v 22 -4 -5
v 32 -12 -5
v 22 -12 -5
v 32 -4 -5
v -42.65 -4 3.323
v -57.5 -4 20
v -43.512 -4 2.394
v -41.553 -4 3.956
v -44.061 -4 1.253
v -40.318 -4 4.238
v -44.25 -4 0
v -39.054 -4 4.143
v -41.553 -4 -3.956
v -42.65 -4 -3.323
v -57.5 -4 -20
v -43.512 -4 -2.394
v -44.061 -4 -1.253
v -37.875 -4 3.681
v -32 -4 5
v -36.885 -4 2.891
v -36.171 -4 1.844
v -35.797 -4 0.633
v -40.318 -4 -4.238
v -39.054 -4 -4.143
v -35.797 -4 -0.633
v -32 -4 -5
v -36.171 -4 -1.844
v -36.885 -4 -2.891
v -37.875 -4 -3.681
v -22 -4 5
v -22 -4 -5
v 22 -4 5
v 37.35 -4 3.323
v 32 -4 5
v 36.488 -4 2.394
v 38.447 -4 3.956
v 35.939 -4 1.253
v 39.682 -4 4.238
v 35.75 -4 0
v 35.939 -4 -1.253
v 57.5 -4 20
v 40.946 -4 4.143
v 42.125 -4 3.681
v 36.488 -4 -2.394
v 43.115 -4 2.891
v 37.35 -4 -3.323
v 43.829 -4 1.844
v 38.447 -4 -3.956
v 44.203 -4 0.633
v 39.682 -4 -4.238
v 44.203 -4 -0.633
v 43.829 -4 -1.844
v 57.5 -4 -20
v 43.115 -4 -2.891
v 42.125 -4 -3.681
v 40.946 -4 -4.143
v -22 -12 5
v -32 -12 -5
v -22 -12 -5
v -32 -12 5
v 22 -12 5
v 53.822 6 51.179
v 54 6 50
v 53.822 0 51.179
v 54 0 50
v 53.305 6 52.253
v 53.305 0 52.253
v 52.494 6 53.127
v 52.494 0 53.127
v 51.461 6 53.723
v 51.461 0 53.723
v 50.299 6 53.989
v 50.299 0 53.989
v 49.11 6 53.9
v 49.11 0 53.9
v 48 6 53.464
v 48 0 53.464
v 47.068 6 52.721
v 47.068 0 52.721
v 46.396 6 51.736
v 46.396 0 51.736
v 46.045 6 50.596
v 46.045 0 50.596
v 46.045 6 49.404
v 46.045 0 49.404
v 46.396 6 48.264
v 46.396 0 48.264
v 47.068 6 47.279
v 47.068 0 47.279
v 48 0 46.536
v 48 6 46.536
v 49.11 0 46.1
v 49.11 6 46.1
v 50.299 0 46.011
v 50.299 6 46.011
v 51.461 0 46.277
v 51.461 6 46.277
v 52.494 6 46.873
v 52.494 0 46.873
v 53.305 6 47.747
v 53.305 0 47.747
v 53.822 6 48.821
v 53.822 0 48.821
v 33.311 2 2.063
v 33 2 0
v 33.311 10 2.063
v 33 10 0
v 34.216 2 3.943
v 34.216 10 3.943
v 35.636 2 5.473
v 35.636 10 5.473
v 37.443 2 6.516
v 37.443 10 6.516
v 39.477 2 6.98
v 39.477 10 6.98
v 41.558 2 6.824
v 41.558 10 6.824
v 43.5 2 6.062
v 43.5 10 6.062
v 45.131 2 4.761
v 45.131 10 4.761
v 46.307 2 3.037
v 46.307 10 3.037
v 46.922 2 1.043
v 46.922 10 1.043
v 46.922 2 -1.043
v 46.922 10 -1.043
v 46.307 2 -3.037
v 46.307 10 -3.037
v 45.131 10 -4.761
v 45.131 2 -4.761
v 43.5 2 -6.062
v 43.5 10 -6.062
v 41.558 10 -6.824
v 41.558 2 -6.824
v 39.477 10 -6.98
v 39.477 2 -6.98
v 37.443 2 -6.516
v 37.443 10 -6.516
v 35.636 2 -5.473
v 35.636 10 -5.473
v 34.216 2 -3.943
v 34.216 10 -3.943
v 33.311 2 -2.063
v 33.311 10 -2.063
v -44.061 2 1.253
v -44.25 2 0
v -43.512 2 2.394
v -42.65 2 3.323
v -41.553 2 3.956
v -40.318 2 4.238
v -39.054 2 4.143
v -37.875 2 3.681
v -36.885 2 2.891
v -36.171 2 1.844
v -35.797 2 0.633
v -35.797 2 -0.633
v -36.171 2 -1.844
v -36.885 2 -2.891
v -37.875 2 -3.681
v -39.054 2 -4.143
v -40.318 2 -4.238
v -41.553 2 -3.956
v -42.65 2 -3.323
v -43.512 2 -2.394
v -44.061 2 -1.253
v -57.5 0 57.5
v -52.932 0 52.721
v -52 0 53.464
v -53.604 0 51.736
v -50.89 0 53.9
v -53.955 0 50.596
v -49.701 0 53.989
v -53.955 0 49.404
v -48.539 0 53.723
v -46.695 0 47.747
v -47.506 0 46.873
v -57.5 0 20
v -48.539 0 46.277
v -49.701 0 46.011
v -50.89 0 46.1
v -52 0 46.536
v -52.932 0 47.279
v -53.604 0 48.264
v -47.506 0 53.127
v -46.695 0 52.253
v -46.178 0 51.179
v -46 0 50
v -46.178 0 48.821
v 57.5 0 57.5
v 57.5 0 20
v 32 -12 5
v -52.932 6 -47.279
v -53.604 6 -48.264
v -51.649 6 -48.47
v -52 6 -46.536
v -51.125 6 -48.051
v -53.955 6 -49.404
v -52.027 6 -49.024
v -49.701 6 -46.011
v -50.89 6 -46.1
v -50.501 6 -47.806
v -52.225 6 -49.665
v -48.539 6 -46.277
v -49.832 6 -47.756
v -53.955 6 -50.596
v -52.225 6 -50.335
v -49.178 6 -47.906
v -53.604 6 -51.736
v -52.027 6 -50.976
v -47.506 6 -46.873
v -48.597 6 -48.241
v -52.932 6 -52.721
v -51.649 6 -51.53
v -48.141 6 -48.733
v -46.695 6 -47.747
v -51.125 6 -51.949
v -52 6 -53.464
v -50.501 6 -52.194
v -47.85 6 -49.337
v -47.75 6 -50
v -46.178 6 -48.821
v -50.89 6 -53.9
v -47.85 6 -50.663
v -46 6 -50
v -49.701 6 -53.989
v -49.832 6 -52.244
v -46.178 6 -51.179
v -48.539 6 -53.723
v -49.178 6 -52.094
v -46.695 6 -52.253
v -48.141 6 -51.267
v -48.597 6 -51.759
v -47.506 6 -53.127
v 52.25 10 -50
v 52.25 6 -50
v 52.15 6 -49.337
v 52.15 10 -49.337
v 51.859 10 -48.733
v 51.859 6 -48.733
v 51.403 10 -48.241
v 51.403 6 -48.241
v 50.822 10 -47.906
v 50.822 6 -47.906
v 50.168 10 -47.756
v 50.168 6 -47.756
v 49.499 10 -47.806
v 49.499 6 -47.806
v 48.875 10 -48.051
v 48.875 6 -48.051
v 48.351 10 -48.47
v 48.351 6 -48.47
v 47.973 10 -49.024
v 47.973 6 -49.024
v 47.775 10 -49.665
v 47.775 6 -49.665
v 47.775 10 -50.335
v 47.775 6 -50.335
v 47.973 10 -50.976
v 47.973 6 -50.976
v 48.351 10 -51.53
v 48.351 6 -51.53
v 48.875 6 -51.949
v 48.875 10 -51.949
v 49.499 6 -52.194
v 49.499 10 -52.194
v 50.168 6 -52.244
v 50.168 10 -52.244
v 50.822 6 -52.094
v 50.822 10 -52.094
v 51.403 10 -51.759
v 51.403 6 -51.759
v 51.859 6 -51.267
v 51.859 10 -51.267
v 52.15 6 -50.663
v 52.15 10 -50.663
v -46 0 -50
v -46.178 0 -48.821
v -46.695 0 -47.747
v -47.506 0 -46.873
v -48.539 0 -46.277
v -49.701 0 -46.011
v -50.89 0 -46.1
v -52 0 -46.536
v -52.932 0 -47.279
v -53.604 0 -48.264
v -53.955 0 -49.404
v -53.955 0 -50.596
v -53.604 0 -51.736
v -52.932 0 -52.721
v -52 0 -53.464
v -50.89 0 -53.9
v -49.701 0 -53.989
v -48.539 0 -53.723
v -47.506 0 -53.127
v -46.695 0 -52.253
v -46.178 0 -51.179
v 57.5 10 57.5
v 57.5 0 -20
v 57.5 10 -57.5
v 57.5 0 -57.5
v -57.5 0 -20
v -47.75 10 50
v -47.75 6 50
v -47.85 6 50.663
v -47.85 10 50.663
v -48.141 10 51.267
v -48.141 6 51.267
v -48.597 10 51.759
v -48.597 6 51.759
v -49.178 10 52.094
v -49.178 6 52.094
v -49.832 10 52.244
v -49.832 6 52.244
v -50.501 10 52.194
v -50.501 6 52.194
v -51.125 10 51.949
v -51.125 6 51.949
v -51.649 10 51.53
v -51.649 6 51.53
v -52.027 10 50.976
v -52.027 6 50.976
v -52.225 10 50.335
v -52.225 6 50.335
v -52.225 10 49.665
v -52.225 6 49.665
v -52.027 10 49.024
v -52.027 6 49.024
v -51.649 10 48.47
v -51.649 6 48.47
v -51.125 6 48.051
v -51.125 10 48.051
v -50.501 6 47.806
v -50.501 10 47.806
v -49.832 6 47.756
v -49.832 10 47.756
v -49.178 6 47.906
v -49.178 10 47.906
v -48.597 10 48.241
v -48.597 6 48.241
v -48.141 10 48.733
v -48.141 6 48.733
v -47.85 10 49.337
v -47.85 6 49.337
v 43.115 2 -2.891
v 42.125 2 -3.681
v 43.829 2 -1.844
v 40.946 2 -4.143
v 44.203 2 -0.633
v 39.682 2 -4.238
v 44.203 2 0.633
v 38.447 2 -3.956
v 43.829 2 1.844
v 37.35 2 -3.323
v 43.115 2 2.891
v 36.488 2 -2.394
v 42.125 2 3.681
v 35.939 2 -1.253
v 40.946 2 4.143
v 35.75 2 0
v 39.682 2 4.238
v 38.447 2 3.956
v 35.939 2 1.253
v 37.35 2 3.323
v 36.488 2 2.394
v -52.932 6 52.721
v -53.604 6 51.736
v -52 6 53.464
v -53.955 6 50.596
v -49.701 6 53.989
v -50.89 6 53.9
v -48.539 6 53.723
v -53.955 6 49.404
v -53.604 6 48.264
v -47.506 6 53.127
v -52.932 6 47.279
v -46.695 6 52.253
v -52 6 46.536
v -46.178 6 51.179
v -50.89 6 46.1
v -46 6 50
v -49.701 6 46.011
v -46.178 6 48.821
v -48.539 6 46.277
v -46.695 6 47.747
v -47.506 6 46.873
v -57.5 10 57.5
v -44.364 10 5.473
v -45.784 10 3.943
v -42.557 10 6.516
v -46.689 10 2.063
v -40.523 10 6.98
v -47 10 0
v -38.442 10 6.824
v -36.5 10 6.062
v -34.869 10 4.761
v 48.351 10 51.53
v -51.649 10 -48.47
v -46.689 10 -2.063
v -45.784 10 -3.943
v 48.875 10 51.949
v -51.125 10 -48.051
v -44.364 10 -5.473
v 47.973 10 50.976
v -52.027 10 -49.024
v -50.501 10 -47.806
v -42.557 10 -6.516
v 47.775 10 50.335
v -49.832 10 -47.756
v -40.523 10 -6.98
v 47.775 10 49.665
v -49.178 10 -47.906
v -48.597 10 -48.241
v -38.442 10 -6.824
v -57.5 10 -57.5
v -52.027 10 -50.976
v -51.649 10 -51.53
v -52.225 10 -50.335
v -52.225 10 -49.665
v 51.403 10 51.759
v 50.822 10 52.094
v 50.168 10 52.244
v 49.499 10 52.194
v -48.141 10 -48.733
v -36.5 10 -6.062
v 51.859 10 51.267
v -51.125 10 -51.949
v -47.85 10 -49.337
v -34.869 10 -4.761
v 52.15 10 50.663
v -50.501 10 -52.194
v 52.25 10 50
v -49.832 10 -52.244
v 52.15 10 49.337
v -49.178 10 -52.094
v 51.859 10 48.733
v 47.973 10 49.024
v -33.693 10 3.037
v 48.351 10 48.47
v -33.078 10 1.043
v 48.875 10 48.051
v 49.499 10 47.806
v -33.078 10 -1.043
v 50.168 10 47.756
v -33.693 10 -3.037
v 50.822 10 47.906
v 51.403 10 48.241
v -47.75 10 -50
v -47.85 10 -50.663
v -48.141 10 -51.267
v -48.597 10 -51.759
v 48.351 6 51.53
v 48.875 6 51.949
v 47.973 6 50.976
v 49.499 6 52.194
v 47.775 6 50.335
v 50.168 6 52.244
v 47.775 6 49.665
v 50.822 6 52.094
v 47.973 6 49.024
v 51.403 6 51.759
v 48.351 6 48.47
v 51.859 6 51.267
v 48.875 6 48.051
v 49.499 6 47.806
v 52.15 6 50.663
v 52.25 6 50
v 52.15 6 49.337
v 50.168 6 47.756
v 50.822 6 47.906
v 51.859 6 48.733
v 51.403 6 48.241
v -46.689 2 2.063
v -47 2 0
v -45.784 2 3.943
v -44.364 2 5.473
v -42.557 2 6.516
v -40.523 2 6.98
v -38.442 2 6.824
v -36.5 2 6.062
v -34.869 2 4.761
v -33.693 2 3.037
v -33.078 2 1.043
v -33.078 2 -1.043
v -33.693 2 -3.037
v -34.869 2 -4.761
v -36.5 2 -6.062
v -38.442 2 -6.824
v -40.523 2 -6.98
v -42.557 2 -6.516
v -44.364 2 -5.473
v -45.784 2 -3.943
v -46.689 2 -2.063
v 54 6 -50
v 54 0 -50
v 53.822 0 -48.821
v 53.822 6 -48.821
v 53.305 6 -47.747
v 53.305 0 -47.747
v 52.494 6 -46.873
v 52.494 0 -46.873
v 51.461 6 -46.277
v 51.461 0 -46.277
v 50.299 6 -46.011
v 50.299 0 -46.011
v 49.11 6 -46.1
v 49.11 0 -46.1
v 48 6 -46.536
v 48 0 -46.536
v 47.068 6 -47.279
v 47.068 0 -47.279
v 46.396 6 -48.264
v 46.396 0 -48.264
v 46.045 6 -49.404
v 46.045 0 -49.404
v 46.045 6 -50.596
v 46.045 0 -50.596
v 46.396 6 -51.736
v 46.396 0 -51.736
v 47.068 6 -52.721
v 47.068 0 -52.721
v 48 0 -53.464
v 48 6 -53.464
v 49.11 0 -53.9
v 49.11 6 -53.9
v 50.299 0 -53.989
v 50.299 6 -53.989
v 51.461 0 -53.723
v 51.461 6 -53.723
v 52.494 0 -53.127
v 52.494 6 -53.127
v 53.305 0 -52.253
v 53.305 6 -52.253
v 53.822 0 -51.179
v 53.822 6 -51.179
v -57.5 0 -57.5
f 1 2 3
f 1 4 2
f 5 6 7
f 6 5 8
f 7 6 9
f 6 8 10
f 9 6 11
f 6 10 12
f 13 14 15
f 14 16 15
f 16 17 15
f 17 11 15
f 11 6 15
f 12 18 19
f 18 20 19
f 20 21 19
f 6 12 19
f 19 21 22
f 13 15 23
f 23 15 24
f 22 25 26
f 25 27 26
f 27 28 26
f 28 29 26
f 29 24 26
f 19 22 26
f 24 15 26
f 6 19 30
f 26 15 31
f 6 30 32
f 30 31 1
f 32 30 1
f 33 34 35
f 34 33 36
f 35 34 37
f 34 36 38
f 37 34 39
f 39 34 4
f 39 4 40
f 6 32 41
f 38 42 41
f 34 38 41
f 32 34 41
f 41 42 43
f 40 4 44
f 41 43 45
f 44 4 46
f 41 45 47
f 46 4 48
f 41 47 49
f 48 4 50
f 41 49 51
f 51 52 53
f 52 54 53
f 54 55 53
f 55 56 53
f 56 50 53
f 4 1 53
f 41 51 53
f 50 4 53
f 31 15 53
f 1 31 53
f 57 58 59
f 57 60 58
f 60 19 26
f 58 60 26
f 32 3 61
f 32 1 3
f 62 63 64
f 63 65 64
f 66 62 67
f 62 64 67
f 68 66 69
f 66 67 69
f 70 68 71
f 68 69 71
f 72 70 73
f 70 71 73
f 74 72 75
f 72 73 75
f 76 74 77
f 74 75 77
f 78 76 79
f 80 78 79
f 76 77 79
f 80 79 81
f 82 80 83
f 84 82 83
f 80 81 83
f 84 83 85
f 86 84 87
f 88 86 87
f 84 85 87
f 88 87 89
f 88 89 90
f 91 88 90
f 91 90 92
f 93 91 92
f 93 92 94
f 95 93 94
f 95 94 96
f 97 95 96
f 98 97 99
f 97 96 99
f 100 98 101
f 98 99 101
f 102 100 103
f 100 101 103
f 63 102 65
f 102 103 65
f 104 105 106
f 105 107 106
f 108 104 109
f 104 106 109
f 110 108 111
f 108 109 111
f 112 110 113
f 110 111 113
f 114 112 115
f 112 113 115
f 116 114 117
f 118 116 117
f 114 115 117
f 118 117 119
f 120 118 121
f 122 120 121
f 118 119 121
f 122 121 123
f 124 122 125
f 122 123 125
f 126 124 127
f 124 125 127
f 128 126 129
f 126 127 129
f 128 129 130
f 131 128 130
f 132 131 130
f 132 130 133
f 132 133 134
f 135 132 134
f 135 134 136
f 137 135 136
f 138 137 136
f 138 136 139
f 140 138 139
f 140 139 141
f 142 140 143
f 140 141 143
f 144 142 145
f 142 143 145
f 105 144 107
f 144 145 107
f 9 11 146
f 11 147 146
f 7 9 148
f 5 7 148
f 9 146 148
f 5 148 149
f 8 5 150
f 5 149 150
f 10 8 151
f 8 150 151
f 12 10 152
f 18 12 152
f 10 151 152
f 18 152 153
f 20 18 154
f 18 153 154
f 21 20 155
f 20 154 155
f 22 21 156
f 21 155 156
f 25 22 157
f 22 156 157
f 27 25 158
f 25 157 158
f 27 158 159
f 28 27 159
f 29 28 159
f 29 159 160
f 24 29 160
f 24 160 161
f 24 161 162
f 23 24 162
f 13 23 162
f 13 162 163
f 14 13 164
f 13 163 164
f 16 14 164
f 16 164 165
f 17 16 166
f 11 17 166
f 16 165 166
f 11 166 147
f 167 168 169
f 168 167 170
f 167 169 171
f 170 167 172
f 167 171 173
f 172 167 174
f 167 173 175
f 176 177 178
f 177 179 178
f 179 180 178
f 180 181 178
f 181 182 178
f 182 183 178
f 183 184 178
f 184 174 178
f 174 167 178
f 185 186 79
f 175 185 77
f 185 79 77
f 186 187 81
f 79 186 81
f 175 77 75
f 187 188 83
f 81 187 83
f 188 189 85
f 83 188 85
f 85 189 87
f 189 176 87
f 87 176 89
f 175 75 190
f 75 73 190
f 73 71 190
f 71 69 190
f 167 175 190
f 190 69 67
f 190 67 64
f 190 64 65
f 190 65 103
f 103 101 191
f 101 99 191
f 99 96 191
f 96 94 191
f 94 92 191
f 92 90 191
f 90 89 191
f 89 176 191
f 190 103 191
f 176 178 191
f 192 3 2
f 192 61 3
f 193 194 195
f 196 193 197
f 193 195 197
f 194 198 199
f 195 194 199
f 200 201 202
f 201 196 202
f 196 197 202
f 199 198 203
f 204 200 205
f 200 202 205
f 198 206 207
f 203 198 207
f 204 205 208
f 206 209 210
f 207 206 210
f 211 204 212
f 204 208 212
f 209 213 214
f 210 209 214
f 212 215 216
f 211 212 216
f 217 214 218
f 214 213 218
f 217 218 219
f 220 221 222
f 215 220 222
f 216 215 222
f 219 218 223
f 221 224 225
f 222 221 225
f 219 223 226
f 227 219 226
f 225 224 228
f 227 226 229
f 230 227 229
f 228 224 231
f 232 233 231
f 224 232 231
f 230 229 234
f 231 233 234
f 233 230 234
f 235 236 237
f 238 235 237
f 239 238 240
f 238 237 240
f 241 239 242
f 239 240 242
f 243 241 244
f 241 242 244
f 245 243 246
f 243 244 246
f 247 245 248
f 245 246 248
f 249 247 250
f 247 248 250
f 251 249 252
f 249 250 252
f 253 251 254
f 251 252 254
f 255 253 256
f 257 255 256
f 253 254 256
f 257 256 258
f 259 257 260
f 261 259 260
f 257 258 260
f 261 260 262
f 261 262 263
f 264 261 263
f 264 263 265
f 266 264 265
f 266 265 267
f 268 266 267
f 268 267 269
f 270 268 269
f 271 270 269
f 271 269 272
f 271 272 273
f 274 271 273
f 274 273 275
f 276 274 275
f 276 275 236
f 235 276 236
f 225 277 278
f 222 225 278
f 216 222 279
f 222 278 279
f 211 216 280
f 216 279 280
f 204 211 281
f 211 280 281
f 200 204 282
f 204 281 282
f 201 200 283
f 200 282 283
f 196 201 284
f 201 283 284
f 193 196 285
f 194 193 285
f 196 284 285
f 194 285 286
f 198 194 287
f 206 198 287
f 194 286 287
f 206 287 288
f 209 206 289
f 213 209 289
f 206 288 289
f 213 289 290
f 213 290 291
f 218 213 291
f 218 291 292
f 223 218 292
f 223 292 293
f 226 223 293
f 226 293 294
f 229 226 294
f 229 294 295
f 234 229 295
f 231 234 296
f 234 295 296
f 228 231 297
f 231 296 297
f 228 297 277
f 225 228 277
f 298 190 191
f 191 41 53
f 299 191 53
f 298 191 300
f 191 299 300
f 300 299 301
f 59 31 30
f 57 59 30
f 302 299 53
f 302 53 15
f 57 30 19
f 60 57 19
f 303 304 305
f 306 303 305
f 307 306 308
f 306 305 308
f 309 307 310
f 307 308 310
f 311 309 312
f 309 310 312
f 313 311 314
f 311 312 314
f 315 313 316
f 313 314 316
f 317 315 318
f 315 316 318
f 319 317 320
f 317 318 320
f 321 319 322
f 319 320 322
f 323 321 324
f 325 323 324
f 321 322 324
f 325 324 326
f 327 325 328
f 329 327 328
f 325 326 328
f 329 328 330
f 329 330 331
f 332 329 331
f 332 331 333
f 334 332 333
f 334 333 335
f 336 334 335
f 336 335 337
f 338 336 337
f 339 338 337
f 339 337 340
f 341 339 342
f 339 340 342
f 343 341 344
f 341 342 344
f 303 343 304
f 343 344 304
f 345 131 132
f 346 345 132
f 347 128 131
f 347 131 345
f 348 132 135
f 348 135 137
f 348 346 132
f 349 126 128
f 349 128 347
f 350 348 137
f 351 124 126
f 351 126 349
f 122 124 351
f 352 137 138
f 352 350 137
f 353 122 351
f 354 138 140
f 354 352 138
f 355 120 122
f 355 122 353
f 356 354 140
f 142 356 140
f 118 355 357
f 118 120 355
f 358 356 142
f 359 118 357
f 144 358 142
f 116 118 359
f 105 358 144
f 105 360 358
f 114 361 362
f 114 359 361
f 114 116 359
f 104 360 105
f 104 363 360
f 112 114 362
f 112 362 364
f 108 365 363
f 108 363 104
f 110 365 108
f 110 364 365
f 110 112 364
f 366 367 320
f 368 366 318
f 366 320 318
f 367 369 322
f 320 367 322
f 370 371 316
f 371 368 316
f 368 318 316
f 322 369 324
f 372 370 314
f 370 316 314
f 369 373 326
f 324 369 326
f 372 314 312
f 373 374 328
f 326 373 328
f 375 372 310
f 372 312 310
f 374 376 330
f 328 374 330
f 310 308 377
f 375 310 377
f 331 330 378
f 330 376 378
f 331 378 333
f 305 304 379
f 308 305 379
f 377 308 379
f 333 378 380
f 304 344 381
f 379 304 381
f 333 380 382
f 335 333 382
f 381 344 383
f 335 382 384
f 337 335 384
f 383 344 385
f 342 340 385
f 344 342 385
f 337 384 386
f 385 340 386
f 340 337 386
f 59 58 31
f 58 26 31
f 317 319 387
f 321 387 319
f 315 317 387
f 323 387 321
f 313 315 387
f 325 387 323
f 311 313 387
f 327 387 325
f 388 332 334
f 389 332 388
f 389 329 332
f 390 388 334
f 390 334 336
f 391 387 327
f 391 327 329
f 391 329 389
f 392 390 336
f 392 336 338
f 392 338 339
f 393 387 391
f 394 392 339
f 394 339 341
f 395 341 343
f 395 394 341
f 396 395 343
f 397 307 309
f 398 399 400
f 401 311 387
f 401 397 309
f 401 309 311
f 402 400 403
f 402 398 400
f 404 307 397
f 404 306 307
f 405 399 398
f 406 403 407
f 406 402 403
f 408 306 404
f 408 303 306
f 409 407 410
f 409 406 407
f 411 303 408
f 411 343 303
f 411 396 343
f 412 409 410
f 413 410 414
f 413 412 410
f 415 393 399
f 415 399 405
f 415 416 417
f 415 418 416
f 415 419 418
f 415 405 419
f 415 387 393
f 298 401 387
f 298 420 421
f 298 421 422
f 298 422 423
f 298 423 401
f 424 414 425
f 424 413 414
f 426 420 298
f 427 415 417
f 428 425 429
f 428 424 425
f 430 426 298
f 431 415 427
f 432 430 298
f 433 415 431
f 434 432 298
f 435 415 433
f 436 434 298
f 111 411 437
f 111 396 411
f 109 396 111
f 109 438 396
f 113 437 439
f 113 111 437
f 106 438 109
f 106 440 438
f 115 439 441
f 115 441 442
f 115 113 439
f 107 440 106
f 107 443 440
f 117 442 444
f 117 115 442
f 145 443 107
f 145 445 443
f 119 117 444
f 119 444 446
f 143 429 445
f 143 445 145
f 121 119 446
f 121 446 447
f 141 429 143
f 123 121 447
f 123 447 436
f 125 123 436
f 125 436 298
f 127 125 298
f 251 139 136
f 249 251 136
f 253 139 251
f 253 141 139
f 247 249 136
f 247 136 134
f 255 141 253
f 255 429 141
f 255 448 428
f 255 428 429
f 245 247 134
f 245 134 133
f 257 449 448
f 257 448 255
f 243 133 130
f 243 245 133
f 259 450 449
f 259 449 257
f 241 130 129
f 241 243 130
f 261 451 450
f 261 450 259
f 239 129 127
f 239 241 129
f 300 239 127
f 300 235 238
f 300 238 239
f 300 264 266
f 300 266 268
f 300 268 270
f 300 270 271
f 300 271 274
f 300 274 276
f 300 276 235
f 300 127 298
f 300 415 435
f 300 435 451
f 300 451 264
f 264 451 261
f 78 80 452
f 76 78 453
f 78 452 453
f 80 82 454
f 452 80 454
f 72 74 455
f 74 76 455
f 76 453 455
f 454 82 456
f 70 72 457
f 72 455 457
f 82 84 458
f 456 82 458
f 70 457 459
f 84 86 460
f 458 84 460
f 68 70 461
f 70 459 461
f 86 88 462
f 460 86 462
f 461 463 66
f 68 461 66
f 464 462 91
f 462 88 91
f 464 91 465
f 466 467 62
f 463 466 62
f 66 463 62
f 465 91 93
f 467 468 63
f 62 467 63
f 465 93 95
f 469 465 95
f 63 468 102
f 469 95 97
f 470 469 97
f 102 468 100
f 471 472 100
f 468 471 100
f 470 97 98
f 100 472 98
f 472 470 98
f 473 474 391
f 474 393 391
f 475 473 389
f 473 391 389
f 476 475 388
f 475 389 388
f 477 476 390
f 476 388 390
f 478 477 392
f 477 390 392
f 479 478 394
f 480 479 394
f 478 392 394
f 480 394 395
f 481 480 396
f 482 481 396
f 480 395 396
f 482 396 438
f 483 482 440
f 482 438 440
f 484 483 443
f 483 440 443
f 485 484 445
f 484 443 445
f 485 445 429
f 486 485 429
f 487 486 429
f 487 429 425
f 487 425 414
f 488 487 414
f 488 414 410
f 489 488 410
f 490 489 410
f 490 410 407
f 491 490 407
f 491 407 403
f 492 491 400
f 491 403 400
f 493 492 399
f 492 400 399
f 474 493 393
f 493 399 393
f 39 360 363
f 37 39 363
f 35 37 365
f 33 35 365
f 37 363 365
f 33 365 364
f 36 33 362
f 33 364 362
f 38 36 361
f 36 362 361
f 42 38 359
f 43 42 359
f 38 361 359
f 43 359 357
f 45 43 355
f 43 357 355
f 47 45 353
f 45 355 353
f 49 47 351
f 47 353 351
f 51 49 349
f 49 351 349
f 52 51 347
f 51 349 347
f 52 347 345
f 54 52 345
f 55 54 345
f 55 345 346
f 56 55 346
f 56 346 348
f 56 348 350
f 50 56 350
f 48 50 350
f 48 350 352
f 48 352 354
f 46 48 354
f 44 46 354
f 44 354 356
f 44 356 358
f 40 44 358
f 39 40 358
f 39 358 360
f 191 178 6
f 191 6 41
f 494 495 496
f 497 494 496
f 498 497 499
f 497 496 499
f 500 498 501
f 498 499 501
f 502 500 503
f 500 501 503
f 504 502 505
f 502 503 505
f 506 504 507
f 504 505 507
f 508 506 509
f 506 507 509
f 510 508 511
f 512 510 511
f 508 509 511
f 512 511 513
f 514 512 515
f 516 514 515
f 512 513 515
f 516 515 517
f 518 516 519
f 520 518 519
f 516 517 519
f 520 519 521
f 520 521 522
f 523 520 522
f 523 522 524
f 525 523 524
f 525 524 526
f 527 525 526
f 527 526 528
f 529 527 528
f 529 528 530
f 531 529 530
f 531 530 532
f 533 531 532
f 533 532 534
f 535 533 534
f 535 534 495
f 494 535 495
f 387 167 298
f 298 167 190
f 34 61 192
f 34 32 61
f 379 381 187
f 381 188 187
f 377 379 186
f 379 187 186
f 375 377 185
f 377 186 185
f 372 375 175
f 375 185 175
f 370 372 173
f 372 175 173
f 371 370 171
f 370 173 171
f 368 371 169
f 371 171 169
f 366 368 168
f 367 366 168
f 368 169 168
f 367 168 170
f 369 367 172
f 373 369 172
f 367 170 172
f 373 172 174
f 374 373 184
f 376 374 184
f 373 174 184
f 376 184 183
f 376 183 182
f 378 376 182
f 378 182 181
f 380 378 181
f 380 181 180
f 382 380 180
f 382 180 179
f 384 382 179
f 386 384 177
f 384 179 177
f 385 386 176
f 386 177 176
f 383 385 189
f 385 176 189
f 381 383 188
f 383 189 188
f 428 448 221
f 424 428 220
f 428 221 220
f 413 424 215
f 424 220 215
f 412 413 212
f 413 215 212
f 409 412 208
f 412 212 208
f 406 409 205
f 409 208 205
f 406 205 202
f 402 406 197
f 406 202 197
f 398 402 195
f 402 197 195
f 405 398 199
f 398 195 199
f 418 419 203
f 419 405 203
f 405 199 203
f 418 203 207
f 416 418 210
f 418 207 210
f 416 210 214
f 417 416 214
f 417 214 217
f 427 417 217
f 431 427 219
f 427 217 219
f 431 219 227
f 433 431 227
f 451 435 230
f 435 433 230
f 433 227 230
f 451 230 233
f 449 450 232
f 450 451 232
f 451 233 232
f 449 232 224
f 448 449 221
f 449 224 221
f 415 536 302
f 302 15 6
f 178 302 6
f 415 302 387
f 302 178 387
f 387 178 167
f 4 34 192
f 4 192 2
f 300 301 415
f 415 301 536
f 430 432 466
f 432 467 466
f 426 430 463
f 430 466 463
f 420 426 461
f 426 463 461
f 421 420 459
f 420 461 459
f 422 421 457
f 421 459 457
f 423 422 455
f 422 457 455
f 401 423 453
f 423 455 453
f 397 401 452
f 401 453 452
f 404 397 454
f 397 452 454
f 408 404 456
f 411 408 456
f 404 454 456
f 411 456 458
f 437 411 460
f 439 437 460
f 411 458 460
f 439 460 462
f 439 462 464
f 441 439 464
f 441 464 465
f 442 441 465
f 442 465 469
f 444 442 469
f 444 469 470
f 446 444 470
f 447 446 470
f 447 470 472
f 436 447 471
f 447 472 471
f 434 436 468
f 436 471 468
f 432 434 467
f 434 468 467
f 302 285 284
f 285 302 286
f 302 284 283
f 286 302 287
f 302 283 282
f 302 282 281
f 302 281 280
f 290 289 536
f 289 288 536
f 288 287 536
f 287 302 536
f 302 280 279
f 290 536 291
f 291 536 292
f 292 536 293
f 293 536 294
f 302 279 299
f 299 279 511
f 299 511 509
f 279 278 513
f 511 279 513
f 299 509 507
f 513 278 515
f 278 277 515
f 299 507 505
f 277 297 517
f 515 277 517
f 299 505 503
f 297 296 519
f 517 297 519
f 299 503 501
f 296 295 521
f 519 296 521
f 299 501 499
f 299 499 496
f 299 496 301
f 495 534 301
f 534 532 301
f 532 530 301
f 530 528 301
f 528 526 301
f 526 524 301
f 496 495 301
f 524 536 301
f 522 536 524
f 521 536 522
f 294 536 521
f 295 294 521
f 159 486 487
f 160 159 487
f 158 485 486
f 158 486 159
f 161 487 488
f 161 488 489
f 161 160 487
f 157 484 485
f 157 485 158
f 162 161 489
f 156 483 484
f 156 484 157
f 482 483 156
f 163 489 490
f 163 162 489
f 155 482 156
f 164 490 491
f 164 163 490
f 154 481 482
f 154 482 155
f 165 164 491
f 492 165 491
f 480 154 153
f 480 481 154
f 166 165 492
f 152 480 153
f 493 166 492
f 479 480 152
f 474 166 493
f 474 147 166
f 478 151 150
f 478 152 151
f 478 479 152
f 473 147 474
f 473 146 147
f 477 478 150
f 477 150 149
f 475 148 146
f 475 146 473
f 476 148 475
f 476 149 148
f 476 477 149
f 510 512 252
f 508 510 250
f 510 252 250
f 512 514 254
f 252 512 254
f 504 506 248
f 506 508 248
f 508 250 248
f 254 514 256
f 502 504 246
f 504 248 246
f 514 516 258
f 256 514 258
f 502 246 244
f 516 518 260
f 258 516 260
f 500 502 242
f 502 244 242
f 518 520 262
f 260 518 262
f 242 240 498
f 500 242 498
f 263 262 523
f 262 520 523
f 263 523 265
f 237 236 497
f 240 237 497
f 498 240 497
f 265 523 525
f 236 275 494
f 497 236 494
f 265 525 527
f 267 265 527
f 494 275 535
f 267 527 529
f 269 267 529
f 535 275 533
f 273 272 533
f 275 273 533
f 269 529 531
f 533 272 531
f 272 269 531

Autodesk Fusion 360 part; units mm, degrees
sketch "Sketch1" plane through (0, 0, 0) normal (0, 1, 0) x (1, 0, 0)
  line L0 (50, 50) -> (-50, 50)
  line L1 (-50, 50) -> (-50, -50)
  line L2 (-50, -50) -> (50, -50)
  line L3 (50, -50) -> (50, 50)
  line L4 (50, 50) -> (-50, -50) construction
  line L5 (-50, 50) -> (50, -50) construction
  circle A0 centre (-50, 50) radius 2.25
  circle A1 centre (50, 50) radius 2.25
  circle A2 centre (-50, -50) radius 2.25
  circle A3 centre (50, -50) radius 2.25
  line L6 (57.5, 57.5) -> (-57.5, 57.5)
  line L7 (-57.5, 57.5) -> (-57.5, -57.5)
  line L8 (-57.5, -57.5) -> (57.5, -57.5)
  line L9 (57.5, -57.5) -> (57.5, 57.5)
  line L10 (57.5, 57.5) -> (-57.5, -57.5) construction
  line L11 (-57.5, 57.5) -> (57.5, -57.5) construction
  circle A4 centre (-50, 50) radius 4
  circle A5 centre (50, 50) radius 4
  circle A6 centre (50, -50) radius 4
  circle A7 centre (-50, -50) radius 4
  dimension "d1" = 100
  dimension "d2" = 100
  dimension "d3" = 4.5
  dimension "d4" = 4.5
  dimension "d5" = 4.5
  dimension "d6" = 4.5
  dimension "d7" = 115
  dimension "d8" = 115
  dimension "d11" = 8
  dimension "d12" = 8
  dimension "d13" = 8
  dimension "d14" = 8
extrude "Extrude1" add sketch "Sketch1" along normal blind 10 contours L0 L1 A0 A4 | L0 L1 A0 A4 | L0 L1 L2 L3 A4 A5 A6 A7 | L0 L3 A1 A5 | L0 L3 A1 A5 | L1 L2 A2 A7 | L1 L2 A2 A7 | L2 L3 A3 A6 | L2 L3 A3 A6 | L6 L7 L8 L9
extrude "Extrude2" cut sketch "Sketch1" along normal blind 6 contours L0 L1 A0 A4 | L0 L1 A0 A4 | L0 L3 A1 A5 | L0 L3 A1 A5 | L1 L2 A2 A7 | L1 L2 A2 A7 | L2 L3 A3 A6 | L2 L3 A3 A6
sketch "Sketch2" plane through (0, 0, 0) normal (0, 1, 0) x (1, 0, 0)
  line L0 (57.5, 20) -> (-57.5, 20)
  line L1 (-57.5, 20) -> (-57.5, -20)
  line L2 (-57.5, -20) -> (57.5, -20)
  line L3 (57.5, -20) -> (57.5, 20)
  line L4 (57.5, 20) -> (-57.5, -20) construction
  line L5 (-57.5, 20) -> (57.5, -20) construction
  dimension "d17" = 115
  dimension "d18" = 40
extrude "Extrude3" add sketch "Sketch2" against normal blind 20
sketch "Sketch3" plane through (0, 10, 0) normal (0, 1, 0) x (-1, 0, 0)
  circle A0 centre (50, -50) radius 2.25
  circle A1 centre (-50, -50) radius 2.25
  circle A2 centre (-50, 50) radius 2.25
  circle A3 centre (50, 50) radius 2.25
  line L0 (-57.5, 57.5) -> (-57.5, -57.5)
  line L1 (-57.5, -57.5) -> (57.5, -57.5)
  line L2 (57.5, -57.5) -> (57.5, 57.5)
  line L3 (57.5, 57.5) -> (-57.5, 57.5)
  circle A4 centre (-40, 0) radius 7
  circle A5 centre (40, 0) radius 7
  circle A6 centre (40, 0) radius 4.25
  circle A7 centre (-40, 0) radius 4.25
  dimension "d21" = 14
  dimension "d22" = 14
  dimension "d23" = 8.5
  dimension "d24" = 8.5
extrude "Extrude4" cut sketch "Sketch3" against normal blind 8 contours A4 | A5
extrude "Extrude5" cut 2 faces at (-40.8833, 10, 1.9427) (39.1167, 10, 1.9427) along direction (0, -1, 0) blind 37
extrude "Extrude6" cut 1 faces at (-12.625, -20, 14.5602) along direction (0, 1, 0) blind 15
extrude "Extrude7" cut 1 faces at (-12.625, -5, 14.5602) along direction (0, 1, 0) blind 1
sketch "Sketch4" plane through (0, -4, 0) normal (0, -1, 0) x (1, 0, 0)
  circle A0 centre (-40, 0) radius 4.25
  circle A1 centre (40, 0) radius 4.25
  line L0 (57.5, -20) -> (57.5, 20)
  line L1 (57.5, 20) -> (-57.5, 20)
  line L2 (-57.5, 20) -> (-57.5, -20)
  line L3 (-57.5, -20) -> (57.5, -20)
  line L4 (-22, 5) -> (-32, 5)
  line L5 (-32, 5) -> (-32, -5)
  line L6 (-32, -5) -> (-22, -5)
  line L7 (-22, -5) -> (-22, 5)
  line L8 (-22, 5) -> (-32, -5) construction
  line L9 (-32, 5) -> (-22, -5) construction
  line L10 (0, 1.75) -> (0, 22.5)
  line L11 (22, 5) -> (32, 5)
  line L12 (32, 5) -> (32, -5)
  line L13 (32, -5) -> (22, -5)
  line L14 (22, -5) -> (22, 5)
  point P0 (-27, 0)
  dimension "d33" = 10
  dimension "d34" = 10
extrude "Extrude8" add sketch "Sketch4" along normal blind 8 contours L4 L5 L6 L7 | L11 L12 L13 L14
